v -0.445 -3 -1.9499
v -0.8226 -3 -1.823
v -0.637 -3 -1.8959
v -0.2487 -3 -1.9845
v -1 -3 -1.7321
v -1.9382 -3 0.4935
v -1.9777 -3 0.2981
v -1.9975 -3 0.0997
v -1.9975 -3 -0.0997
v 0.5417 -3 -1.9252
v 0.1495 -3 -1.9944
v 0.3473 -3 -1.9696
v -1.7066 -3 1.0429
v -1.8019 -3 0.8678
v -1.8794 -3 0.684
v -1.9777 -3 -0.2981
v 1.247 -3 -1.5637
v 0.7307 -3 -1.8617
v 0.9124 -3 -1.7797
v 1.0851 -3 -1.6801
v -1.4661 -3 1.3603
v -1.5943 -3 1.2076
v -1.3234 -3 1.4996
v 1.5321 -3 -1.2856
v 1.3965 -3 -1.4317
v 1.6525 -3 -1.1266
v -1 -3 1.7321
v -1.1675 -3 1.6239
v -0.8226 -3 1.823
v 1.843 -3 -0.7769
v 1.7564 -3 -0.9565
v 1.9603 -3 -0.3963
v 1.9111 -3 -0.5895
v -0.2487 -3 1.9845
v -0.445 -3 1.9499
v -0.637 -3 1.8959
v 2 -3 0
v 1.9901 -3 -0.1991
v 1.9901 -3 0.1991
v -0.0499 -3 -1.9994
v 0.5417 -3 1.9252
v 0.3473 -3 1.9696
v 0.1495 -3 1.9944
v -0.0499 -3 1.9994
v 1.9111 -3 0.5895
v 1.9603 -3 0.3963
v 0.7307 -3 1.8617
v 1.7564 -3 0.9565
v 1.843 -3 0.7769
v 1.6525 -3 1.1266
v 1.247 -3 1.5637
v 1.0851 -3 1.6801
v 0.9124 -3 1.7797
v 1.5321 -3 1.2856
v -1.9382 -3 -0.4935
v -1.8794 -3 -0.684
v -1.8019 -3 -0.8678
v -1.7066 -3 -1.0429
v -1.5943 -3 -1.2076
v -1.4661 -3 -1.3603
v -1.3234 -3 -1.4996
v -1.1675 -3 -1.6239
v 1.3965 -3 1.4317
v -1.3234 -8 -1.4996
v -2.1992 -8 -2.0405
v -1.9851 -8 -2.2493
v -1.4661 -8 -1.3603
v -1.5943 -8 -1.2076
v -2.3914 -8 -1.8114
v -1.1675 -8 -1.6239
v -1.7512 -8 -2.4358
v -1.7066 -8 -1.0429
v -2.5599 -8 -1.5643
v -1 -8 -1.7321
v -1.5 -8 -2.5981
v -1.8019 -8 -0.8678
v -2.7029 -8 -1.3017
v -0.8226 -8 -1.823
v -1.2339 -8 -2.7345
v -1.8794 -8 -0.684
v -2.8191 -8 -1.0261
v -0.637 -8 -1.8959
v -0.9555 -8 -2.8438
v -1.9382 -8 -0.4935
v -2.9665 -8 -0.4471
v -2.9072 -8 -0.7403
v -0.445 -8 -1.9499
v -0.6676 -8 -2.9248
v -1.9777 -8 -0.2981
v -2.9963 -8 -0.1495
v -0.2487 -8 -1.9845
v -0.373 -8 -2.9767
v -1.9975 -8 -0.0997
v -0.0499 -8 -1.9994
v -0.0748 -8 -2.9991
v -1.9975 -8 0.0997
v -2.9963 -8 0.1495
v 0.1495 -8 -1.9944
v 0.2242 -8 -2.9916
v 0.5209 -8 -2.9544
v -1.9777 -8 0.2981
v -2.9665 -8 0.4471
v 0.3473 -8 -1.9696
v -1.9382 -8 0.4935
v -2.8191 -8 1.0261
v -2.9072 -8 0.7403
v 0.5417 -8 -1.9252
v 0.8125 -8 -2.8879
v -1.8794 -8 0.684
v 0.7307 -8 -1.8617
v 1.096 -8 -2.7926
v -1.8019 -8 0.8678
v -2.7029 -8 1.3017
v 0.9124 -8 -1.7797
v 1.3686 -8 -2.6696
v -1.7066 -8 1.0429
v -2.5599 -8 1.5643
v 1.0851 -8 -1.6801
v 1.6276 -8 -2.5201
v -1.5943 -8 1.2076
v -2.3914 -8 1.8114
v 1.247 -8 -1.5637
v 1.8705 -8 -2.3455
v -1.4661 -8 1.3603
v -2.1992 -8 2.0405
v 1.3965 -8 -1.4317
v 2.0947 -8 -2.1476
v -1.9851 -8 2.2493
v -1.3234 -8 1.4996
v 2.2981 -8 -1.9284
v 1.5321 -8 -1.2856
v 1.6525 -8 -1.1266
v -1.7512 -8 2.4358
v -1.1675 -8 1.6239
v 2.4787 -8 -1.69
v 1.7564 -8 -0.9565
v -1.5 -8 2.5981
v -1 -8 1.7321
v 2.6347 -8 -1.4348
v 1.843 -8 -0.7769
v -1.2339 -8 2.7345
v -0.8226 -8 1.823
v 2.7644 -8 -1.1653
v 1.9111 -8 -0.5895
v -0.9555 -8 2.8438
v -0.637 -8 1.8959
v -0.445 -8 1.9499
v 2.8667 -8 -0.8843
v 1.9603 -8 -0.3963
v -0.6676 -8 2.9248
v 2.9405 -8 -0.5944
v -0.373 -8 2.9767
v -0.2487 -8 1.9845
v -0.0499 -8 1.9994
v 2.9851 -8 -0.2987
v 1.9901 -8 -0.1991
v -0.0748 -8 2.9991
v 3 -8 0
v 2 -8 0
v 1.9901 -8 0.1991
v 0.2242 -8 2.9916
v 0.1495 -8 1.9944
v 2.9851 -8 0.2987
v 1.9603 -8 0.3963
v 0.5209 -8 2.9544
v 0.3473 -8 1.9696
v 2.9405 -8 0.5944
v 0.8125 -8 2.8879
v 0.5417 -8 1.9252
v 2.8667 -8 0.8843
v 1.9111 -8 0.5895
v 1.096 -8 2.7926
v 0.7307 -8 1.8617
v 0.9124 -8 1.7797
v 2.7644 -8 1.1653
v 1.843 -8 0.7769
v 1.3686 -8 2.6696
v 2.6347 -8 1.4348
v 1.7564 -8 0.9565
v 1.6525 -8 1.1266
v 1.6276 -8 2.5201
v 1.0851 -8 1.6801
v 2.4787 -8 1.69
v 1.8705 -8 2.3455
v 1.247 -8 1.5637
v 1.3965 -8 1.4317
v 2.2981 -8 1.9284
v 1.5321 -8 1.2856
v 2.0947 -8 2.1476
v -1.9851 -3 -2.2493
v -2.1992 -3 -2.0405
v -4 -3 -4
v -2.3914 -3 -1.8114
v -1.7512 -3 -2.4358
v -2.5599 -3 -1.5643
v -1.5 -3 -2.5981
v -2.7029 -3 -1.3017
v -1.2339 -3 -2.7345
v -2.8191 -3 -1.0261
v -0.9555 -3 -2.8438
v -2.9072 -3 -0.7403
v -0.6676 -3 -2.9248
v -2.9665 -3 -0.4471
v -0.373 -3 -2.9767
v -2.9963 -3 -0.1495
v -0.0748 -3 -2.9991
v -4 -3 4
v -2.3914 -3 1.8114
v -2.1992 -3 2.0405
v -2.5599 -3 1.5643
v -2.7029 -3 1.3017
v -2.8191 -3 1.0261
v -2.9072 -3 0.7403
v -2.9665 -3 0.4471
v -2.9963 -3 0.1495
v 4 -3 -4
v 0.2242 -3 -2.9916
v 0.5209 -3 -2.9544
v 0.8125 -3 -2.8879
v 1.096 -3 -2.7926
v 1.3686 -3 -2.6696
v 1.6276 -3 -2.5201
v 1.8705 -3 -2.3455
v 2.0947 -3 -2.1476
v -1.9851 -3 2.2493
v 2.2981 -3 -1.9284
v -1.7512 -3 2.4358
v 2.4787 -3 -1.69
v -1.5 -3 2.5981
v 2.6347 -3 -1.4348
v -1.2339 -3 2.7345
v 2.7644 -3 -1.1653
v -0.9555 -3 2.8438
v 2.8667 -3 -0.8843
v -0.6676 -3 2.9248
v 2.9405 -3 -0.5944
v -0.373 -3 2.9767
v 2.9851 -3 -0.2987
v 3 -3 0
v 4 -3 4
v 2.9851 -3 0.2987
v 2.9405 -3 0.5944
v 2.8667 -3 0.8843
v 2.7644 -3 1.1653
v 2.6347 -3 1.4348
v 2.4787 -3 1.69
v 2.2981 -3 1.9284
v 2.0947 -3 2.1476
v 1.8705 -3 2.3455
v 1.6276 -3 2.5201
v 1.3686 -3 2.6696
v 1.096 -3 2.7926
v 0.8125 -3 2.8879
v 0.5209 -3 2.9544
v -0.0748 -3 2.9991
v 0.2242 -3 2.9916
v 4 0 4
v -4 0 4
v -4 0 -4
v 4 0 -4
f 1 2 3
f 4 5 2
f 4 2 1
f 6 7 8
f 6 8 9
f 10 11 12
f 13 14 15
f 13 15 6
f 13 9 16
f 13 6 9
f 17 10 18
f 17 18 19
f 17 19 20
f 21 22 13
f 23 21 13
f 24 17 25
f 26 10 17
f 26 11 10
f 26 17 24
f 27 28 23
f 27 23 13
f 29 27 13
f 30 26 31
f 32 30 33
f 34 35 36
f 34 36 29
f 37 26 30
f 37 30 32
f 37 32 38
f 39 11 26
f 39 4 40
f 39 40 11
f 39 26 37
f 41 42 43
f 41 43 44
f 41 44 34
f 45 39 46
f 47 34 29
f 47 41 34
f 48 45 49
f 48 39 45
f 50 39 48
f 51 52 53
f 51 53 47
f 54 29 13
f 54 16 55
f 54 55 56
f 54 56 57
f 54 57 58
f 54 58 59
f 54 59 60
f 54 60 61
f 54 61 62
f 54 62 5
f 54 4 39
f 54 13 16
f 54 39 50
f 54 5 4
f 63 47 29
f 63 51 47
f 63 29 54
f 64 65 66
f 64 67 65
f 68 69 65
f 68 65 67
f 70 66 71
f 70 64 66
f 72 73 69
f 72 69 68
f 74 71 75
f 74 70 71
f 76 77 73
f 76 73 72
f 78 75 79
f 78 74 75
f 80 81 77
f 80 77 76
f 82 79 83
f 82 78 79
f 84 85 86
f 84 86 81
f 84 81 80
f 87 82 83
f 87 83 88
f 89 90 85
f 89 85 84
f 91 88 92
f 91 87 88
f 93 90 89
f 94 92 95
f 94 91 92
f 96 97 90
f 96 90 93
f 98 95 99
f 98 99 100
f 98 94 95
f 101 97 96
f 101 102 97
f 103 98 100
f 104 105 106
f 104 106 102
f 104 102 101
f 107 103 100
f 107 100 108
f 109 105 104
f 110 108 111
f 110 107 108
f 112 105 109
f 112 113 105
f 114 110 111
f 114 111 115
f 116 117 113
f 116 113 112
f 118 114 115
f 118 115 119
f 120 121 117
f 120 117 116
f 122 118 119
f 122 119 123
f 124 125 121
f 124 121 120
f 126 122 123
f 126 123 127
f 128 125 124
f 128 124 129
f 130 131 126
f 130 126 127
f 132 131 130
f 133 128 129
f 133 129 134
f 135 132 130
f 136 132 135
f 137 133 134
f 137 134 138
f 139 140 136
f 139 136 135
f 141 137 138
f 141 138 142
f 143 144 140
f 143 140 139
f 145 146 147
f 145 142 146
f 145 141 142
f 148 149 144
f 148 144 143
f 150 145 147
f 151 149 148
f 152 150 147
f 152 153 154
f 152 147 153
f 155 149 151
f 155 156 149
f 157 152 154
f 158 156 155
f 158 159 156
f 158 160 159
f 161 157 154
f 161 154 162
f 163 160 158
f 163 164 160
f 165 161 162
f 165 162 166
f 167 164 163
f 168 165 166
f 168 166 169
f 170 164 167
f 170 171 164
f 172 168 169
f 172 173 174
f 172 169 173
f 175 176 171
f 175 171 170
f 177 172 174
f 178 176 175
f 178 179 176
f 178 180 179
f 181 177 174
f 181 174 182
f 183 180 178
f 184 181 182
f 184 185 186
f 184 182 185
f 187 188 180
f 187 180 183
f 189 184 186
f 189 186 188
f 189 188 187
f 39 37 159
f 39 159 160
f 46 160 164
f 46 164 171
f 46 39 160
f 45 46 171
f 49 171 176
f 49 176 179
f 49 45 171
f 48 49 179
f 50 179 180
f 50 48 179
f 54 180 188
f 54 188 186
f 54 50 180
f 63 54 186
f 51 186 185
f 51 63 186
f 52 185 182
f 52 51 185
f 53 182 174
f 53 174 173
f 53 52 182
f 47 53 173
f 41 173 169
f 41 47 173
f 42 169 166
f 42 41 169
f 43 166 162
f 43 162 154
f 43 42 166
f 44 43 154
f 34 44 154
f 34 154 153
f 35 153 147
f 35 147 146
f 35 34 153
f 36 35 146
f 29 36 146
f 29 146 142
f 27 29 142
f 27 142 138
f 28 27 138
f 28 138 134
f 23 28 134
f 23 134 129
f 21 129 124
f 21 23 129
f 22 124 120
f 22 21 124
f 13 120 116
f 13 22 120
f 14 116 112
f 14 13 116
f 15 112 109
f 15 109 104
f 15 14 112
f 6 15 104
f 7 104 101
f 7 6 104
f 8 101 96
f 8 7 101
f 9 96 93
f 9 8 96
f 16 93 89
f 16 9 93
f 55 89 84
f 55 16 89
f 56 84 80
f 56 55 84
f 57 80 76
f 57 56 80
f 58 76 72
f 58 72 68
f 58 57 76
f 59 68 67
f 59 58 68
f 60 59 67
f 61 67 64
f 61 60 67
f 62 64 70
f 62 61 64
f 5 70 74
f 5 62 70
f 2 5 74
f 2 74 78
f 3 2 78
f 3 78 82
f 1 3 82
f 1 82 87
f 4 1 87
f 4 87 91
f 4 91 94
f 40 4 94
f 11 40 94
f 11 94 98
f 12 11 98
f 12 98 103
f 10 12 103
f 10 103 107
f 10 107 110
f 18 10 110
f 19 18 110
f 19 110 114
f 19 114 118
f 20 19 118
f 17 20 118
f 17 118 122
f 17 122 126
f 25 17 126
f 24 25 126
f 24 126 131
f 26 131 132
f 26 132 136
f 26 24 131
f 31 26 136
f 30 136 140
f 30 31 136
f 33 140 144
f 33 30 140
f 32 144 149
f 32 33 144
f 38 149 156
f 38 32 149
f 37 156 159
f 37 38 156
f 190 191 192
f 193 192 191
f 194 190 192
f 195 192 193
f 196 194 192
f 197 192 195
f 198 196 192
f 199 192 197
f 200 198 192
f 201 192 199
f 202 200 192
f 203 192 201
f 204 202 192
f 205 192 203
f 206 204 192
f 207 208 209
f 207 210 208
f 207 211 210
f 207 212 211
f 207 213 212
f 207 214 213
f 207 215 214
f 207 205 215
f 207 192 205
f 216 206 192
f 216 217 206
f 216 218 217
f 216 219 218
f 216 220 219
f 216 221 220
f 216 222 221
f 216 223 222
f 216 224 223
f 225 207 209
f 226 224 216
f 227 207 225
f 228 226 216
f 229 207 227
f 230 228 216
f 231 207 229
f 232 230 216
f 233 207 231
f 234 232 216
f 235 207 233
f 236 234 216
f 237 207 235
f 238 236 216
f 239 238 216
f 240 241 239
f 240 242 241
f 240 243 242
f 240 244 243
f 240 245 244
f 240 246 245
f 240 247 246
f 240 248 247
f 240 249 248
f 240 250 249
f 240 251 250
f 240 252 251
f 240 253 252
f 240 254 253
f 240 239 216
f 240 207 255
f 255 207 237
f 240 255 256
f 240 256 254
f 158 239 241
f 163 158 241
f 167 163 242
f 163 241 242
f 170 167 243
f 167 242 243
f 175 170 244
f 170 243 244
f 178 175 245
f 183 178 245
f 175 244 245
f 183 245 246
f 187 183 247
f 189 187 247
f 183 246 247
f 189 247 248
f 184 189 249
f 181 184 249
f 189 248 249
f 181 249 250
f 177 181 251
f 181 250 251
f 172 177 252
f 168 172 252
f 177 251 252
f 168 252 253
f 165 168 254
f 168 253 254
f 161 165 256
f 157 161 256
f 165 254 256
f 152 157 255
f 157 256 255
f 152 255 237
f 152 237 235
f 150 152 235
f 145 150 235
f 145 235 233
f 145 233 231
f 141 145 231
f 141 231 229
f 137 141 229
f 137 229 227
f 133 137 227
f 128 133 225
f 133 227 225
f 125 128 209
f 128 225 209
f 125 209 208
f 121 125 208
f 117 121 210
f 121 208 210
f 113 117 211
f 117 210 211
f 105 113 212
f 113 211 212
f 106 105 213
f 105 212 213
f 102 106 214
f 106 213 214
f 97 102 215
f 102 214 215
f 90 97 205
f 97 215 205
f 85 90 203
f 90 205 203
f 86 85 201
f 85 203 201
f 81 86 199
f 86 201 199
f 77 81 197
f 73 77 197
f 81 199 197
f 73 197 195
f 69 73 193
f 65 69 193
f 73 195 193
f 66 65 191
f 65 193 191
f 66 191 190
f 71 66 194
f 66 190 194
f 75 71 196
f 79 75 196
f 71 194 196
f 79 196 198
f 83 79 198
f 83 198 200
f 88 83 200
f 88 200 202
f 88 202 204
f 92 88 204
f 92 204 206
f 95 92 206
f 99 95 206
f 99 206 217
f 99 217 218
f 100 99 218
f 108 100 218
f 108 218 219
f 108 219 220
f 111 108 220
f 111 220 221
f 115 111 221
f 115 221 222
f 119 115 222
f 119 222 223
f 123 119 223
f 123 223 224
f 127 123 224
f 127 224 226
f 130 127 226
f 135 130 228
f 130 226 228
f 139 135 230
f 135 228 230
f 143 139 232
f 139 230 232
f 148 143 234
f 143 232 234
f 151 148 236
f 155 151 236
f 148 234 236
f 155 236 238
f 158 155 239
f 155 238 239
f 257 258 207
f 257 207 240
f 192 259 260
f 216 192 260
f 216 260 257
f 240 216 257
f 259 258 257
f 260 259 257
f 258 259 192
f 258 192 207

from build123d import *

# Parameters (mm, degrees)
F0_W     = 8
F0_H     = 8
F1_DEPTH = 3
F2_R     = 3
F2_R_2   = 2
F3_DEPTH = 5


with BuildPart() as f1:
    # F0 (on Front) → F1 (new body)
    with BuildSketch(Plane.XZ):
        Rectangle(F0_W, F0_H)
    extrude(amount=F1_DEPTH)

    # F2 (on face) → F3 (join)
    with BuildSketch(Plane.XZ.offset(3)):
        Circle(F2_R)
        Circle(F2_R_2, mode=Mode.SUBTRACT)
    extrude(amount=F3_DEPTH)


solid = f1.part
